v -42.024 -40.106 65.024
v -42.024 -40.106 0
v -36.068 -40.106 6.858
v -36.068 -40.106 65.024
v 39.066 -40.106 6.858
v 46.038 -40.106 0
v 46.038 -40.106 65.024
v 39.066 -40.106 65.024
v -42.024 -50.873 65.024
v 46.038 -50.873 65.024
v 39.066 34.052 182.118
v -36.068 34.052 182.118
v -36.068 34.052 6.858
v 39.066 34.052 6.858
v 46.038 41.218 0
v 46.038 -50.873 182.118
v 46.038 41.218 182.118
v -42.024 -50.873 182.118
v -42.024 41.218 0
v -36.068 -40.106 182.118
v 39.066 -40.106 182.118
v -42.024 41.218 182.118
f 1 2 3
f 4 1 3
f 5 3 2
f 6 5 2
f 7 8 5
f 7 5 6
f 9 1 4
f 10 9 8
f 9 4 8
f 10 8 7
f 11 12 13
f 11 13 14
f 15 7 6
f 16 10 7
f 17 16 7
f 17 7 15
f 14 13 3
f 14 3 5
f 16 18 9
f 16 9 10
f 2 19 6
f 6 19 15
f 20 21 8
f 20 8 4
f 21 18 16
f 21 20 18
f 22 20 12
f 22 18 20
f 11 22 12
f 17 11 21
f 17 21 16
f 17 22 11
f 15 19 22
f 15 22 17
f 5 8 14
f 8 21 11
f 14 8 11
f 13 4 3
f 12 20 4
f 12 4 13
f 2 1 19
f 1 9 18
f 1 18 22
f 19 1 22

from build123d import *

# Parameters (mm, degrees)
F0_W     = 88.061482
F0_H     = 88.219233
F1_DEPTH = 182.118
F2_W     = 75.133953
F2_H     = 74.157518
F3_DEPTH = 175.26
F4_W     = 81.089504
F4_H     = 6.89533
F5_DEPTH = 183.134
F6_W     = 6.971978
F6_H     = 6.89533
F7_DEPTH = 187.706
F8_W     = 81.089504
F8_H     = 10.767195
F8_W_2   = 6.971978
F9_DEPTH = 117.094


with BuildPart() as f1:
    # F0 (on Top) → F1 (new body)
    with BuildSketch(Plane.XY):
        with Locations((2.006993, -2.8916)):
            Rectangle(F0_W, F0_H)
    extrude(amount=F1_DEPTH)

    # F2 (on face) → F3 (cut)
    with BuildSketch(Plane.XY.offset(182.118)):
        with Locations((1.49878, -3.027128)):
            Rectangle(F2_W, F2_H)
    extrude(amount=-F3_DEPTH, mode=Mode.SUBTRACT)

    # F4 (on face) → F5 (cut)
    with BuildSketch(Plane.XY.offset(182.118)):
        with Locations((-1.478996, -43.553552)):
            Rectangle(F4_W, F4_H)
    extrude(amount=-F5_DEPTH, mode=Mode.SUBTRACT)

    # F6 (on face) → F7 (cut)
    with BuildSketch(Plane(origin=(0, 0, 0), x_dir=(1, 0, 0), z_dir=(0, 0, -1))):
        with Locations((42.551745, 43.553552)):
            Rectangle(F6_W, F6_H)
    extrude(amount=-F7_DEPTH, mode=Mode.SUBTRACT)

    # F8 (on face) → F9 (join)
    with BuildSketch(Plane.XY.offset(182.118)):
        with Locations((-1.478996, -45.489484)):
            Rectangle(F8_W, F8_H)
        with Locations((42.551745, -45.489484)):
            Rectangle(F8_W_2, F8_H)
    extrude(amount=-F9_DEPTH)


solid = f1.part
